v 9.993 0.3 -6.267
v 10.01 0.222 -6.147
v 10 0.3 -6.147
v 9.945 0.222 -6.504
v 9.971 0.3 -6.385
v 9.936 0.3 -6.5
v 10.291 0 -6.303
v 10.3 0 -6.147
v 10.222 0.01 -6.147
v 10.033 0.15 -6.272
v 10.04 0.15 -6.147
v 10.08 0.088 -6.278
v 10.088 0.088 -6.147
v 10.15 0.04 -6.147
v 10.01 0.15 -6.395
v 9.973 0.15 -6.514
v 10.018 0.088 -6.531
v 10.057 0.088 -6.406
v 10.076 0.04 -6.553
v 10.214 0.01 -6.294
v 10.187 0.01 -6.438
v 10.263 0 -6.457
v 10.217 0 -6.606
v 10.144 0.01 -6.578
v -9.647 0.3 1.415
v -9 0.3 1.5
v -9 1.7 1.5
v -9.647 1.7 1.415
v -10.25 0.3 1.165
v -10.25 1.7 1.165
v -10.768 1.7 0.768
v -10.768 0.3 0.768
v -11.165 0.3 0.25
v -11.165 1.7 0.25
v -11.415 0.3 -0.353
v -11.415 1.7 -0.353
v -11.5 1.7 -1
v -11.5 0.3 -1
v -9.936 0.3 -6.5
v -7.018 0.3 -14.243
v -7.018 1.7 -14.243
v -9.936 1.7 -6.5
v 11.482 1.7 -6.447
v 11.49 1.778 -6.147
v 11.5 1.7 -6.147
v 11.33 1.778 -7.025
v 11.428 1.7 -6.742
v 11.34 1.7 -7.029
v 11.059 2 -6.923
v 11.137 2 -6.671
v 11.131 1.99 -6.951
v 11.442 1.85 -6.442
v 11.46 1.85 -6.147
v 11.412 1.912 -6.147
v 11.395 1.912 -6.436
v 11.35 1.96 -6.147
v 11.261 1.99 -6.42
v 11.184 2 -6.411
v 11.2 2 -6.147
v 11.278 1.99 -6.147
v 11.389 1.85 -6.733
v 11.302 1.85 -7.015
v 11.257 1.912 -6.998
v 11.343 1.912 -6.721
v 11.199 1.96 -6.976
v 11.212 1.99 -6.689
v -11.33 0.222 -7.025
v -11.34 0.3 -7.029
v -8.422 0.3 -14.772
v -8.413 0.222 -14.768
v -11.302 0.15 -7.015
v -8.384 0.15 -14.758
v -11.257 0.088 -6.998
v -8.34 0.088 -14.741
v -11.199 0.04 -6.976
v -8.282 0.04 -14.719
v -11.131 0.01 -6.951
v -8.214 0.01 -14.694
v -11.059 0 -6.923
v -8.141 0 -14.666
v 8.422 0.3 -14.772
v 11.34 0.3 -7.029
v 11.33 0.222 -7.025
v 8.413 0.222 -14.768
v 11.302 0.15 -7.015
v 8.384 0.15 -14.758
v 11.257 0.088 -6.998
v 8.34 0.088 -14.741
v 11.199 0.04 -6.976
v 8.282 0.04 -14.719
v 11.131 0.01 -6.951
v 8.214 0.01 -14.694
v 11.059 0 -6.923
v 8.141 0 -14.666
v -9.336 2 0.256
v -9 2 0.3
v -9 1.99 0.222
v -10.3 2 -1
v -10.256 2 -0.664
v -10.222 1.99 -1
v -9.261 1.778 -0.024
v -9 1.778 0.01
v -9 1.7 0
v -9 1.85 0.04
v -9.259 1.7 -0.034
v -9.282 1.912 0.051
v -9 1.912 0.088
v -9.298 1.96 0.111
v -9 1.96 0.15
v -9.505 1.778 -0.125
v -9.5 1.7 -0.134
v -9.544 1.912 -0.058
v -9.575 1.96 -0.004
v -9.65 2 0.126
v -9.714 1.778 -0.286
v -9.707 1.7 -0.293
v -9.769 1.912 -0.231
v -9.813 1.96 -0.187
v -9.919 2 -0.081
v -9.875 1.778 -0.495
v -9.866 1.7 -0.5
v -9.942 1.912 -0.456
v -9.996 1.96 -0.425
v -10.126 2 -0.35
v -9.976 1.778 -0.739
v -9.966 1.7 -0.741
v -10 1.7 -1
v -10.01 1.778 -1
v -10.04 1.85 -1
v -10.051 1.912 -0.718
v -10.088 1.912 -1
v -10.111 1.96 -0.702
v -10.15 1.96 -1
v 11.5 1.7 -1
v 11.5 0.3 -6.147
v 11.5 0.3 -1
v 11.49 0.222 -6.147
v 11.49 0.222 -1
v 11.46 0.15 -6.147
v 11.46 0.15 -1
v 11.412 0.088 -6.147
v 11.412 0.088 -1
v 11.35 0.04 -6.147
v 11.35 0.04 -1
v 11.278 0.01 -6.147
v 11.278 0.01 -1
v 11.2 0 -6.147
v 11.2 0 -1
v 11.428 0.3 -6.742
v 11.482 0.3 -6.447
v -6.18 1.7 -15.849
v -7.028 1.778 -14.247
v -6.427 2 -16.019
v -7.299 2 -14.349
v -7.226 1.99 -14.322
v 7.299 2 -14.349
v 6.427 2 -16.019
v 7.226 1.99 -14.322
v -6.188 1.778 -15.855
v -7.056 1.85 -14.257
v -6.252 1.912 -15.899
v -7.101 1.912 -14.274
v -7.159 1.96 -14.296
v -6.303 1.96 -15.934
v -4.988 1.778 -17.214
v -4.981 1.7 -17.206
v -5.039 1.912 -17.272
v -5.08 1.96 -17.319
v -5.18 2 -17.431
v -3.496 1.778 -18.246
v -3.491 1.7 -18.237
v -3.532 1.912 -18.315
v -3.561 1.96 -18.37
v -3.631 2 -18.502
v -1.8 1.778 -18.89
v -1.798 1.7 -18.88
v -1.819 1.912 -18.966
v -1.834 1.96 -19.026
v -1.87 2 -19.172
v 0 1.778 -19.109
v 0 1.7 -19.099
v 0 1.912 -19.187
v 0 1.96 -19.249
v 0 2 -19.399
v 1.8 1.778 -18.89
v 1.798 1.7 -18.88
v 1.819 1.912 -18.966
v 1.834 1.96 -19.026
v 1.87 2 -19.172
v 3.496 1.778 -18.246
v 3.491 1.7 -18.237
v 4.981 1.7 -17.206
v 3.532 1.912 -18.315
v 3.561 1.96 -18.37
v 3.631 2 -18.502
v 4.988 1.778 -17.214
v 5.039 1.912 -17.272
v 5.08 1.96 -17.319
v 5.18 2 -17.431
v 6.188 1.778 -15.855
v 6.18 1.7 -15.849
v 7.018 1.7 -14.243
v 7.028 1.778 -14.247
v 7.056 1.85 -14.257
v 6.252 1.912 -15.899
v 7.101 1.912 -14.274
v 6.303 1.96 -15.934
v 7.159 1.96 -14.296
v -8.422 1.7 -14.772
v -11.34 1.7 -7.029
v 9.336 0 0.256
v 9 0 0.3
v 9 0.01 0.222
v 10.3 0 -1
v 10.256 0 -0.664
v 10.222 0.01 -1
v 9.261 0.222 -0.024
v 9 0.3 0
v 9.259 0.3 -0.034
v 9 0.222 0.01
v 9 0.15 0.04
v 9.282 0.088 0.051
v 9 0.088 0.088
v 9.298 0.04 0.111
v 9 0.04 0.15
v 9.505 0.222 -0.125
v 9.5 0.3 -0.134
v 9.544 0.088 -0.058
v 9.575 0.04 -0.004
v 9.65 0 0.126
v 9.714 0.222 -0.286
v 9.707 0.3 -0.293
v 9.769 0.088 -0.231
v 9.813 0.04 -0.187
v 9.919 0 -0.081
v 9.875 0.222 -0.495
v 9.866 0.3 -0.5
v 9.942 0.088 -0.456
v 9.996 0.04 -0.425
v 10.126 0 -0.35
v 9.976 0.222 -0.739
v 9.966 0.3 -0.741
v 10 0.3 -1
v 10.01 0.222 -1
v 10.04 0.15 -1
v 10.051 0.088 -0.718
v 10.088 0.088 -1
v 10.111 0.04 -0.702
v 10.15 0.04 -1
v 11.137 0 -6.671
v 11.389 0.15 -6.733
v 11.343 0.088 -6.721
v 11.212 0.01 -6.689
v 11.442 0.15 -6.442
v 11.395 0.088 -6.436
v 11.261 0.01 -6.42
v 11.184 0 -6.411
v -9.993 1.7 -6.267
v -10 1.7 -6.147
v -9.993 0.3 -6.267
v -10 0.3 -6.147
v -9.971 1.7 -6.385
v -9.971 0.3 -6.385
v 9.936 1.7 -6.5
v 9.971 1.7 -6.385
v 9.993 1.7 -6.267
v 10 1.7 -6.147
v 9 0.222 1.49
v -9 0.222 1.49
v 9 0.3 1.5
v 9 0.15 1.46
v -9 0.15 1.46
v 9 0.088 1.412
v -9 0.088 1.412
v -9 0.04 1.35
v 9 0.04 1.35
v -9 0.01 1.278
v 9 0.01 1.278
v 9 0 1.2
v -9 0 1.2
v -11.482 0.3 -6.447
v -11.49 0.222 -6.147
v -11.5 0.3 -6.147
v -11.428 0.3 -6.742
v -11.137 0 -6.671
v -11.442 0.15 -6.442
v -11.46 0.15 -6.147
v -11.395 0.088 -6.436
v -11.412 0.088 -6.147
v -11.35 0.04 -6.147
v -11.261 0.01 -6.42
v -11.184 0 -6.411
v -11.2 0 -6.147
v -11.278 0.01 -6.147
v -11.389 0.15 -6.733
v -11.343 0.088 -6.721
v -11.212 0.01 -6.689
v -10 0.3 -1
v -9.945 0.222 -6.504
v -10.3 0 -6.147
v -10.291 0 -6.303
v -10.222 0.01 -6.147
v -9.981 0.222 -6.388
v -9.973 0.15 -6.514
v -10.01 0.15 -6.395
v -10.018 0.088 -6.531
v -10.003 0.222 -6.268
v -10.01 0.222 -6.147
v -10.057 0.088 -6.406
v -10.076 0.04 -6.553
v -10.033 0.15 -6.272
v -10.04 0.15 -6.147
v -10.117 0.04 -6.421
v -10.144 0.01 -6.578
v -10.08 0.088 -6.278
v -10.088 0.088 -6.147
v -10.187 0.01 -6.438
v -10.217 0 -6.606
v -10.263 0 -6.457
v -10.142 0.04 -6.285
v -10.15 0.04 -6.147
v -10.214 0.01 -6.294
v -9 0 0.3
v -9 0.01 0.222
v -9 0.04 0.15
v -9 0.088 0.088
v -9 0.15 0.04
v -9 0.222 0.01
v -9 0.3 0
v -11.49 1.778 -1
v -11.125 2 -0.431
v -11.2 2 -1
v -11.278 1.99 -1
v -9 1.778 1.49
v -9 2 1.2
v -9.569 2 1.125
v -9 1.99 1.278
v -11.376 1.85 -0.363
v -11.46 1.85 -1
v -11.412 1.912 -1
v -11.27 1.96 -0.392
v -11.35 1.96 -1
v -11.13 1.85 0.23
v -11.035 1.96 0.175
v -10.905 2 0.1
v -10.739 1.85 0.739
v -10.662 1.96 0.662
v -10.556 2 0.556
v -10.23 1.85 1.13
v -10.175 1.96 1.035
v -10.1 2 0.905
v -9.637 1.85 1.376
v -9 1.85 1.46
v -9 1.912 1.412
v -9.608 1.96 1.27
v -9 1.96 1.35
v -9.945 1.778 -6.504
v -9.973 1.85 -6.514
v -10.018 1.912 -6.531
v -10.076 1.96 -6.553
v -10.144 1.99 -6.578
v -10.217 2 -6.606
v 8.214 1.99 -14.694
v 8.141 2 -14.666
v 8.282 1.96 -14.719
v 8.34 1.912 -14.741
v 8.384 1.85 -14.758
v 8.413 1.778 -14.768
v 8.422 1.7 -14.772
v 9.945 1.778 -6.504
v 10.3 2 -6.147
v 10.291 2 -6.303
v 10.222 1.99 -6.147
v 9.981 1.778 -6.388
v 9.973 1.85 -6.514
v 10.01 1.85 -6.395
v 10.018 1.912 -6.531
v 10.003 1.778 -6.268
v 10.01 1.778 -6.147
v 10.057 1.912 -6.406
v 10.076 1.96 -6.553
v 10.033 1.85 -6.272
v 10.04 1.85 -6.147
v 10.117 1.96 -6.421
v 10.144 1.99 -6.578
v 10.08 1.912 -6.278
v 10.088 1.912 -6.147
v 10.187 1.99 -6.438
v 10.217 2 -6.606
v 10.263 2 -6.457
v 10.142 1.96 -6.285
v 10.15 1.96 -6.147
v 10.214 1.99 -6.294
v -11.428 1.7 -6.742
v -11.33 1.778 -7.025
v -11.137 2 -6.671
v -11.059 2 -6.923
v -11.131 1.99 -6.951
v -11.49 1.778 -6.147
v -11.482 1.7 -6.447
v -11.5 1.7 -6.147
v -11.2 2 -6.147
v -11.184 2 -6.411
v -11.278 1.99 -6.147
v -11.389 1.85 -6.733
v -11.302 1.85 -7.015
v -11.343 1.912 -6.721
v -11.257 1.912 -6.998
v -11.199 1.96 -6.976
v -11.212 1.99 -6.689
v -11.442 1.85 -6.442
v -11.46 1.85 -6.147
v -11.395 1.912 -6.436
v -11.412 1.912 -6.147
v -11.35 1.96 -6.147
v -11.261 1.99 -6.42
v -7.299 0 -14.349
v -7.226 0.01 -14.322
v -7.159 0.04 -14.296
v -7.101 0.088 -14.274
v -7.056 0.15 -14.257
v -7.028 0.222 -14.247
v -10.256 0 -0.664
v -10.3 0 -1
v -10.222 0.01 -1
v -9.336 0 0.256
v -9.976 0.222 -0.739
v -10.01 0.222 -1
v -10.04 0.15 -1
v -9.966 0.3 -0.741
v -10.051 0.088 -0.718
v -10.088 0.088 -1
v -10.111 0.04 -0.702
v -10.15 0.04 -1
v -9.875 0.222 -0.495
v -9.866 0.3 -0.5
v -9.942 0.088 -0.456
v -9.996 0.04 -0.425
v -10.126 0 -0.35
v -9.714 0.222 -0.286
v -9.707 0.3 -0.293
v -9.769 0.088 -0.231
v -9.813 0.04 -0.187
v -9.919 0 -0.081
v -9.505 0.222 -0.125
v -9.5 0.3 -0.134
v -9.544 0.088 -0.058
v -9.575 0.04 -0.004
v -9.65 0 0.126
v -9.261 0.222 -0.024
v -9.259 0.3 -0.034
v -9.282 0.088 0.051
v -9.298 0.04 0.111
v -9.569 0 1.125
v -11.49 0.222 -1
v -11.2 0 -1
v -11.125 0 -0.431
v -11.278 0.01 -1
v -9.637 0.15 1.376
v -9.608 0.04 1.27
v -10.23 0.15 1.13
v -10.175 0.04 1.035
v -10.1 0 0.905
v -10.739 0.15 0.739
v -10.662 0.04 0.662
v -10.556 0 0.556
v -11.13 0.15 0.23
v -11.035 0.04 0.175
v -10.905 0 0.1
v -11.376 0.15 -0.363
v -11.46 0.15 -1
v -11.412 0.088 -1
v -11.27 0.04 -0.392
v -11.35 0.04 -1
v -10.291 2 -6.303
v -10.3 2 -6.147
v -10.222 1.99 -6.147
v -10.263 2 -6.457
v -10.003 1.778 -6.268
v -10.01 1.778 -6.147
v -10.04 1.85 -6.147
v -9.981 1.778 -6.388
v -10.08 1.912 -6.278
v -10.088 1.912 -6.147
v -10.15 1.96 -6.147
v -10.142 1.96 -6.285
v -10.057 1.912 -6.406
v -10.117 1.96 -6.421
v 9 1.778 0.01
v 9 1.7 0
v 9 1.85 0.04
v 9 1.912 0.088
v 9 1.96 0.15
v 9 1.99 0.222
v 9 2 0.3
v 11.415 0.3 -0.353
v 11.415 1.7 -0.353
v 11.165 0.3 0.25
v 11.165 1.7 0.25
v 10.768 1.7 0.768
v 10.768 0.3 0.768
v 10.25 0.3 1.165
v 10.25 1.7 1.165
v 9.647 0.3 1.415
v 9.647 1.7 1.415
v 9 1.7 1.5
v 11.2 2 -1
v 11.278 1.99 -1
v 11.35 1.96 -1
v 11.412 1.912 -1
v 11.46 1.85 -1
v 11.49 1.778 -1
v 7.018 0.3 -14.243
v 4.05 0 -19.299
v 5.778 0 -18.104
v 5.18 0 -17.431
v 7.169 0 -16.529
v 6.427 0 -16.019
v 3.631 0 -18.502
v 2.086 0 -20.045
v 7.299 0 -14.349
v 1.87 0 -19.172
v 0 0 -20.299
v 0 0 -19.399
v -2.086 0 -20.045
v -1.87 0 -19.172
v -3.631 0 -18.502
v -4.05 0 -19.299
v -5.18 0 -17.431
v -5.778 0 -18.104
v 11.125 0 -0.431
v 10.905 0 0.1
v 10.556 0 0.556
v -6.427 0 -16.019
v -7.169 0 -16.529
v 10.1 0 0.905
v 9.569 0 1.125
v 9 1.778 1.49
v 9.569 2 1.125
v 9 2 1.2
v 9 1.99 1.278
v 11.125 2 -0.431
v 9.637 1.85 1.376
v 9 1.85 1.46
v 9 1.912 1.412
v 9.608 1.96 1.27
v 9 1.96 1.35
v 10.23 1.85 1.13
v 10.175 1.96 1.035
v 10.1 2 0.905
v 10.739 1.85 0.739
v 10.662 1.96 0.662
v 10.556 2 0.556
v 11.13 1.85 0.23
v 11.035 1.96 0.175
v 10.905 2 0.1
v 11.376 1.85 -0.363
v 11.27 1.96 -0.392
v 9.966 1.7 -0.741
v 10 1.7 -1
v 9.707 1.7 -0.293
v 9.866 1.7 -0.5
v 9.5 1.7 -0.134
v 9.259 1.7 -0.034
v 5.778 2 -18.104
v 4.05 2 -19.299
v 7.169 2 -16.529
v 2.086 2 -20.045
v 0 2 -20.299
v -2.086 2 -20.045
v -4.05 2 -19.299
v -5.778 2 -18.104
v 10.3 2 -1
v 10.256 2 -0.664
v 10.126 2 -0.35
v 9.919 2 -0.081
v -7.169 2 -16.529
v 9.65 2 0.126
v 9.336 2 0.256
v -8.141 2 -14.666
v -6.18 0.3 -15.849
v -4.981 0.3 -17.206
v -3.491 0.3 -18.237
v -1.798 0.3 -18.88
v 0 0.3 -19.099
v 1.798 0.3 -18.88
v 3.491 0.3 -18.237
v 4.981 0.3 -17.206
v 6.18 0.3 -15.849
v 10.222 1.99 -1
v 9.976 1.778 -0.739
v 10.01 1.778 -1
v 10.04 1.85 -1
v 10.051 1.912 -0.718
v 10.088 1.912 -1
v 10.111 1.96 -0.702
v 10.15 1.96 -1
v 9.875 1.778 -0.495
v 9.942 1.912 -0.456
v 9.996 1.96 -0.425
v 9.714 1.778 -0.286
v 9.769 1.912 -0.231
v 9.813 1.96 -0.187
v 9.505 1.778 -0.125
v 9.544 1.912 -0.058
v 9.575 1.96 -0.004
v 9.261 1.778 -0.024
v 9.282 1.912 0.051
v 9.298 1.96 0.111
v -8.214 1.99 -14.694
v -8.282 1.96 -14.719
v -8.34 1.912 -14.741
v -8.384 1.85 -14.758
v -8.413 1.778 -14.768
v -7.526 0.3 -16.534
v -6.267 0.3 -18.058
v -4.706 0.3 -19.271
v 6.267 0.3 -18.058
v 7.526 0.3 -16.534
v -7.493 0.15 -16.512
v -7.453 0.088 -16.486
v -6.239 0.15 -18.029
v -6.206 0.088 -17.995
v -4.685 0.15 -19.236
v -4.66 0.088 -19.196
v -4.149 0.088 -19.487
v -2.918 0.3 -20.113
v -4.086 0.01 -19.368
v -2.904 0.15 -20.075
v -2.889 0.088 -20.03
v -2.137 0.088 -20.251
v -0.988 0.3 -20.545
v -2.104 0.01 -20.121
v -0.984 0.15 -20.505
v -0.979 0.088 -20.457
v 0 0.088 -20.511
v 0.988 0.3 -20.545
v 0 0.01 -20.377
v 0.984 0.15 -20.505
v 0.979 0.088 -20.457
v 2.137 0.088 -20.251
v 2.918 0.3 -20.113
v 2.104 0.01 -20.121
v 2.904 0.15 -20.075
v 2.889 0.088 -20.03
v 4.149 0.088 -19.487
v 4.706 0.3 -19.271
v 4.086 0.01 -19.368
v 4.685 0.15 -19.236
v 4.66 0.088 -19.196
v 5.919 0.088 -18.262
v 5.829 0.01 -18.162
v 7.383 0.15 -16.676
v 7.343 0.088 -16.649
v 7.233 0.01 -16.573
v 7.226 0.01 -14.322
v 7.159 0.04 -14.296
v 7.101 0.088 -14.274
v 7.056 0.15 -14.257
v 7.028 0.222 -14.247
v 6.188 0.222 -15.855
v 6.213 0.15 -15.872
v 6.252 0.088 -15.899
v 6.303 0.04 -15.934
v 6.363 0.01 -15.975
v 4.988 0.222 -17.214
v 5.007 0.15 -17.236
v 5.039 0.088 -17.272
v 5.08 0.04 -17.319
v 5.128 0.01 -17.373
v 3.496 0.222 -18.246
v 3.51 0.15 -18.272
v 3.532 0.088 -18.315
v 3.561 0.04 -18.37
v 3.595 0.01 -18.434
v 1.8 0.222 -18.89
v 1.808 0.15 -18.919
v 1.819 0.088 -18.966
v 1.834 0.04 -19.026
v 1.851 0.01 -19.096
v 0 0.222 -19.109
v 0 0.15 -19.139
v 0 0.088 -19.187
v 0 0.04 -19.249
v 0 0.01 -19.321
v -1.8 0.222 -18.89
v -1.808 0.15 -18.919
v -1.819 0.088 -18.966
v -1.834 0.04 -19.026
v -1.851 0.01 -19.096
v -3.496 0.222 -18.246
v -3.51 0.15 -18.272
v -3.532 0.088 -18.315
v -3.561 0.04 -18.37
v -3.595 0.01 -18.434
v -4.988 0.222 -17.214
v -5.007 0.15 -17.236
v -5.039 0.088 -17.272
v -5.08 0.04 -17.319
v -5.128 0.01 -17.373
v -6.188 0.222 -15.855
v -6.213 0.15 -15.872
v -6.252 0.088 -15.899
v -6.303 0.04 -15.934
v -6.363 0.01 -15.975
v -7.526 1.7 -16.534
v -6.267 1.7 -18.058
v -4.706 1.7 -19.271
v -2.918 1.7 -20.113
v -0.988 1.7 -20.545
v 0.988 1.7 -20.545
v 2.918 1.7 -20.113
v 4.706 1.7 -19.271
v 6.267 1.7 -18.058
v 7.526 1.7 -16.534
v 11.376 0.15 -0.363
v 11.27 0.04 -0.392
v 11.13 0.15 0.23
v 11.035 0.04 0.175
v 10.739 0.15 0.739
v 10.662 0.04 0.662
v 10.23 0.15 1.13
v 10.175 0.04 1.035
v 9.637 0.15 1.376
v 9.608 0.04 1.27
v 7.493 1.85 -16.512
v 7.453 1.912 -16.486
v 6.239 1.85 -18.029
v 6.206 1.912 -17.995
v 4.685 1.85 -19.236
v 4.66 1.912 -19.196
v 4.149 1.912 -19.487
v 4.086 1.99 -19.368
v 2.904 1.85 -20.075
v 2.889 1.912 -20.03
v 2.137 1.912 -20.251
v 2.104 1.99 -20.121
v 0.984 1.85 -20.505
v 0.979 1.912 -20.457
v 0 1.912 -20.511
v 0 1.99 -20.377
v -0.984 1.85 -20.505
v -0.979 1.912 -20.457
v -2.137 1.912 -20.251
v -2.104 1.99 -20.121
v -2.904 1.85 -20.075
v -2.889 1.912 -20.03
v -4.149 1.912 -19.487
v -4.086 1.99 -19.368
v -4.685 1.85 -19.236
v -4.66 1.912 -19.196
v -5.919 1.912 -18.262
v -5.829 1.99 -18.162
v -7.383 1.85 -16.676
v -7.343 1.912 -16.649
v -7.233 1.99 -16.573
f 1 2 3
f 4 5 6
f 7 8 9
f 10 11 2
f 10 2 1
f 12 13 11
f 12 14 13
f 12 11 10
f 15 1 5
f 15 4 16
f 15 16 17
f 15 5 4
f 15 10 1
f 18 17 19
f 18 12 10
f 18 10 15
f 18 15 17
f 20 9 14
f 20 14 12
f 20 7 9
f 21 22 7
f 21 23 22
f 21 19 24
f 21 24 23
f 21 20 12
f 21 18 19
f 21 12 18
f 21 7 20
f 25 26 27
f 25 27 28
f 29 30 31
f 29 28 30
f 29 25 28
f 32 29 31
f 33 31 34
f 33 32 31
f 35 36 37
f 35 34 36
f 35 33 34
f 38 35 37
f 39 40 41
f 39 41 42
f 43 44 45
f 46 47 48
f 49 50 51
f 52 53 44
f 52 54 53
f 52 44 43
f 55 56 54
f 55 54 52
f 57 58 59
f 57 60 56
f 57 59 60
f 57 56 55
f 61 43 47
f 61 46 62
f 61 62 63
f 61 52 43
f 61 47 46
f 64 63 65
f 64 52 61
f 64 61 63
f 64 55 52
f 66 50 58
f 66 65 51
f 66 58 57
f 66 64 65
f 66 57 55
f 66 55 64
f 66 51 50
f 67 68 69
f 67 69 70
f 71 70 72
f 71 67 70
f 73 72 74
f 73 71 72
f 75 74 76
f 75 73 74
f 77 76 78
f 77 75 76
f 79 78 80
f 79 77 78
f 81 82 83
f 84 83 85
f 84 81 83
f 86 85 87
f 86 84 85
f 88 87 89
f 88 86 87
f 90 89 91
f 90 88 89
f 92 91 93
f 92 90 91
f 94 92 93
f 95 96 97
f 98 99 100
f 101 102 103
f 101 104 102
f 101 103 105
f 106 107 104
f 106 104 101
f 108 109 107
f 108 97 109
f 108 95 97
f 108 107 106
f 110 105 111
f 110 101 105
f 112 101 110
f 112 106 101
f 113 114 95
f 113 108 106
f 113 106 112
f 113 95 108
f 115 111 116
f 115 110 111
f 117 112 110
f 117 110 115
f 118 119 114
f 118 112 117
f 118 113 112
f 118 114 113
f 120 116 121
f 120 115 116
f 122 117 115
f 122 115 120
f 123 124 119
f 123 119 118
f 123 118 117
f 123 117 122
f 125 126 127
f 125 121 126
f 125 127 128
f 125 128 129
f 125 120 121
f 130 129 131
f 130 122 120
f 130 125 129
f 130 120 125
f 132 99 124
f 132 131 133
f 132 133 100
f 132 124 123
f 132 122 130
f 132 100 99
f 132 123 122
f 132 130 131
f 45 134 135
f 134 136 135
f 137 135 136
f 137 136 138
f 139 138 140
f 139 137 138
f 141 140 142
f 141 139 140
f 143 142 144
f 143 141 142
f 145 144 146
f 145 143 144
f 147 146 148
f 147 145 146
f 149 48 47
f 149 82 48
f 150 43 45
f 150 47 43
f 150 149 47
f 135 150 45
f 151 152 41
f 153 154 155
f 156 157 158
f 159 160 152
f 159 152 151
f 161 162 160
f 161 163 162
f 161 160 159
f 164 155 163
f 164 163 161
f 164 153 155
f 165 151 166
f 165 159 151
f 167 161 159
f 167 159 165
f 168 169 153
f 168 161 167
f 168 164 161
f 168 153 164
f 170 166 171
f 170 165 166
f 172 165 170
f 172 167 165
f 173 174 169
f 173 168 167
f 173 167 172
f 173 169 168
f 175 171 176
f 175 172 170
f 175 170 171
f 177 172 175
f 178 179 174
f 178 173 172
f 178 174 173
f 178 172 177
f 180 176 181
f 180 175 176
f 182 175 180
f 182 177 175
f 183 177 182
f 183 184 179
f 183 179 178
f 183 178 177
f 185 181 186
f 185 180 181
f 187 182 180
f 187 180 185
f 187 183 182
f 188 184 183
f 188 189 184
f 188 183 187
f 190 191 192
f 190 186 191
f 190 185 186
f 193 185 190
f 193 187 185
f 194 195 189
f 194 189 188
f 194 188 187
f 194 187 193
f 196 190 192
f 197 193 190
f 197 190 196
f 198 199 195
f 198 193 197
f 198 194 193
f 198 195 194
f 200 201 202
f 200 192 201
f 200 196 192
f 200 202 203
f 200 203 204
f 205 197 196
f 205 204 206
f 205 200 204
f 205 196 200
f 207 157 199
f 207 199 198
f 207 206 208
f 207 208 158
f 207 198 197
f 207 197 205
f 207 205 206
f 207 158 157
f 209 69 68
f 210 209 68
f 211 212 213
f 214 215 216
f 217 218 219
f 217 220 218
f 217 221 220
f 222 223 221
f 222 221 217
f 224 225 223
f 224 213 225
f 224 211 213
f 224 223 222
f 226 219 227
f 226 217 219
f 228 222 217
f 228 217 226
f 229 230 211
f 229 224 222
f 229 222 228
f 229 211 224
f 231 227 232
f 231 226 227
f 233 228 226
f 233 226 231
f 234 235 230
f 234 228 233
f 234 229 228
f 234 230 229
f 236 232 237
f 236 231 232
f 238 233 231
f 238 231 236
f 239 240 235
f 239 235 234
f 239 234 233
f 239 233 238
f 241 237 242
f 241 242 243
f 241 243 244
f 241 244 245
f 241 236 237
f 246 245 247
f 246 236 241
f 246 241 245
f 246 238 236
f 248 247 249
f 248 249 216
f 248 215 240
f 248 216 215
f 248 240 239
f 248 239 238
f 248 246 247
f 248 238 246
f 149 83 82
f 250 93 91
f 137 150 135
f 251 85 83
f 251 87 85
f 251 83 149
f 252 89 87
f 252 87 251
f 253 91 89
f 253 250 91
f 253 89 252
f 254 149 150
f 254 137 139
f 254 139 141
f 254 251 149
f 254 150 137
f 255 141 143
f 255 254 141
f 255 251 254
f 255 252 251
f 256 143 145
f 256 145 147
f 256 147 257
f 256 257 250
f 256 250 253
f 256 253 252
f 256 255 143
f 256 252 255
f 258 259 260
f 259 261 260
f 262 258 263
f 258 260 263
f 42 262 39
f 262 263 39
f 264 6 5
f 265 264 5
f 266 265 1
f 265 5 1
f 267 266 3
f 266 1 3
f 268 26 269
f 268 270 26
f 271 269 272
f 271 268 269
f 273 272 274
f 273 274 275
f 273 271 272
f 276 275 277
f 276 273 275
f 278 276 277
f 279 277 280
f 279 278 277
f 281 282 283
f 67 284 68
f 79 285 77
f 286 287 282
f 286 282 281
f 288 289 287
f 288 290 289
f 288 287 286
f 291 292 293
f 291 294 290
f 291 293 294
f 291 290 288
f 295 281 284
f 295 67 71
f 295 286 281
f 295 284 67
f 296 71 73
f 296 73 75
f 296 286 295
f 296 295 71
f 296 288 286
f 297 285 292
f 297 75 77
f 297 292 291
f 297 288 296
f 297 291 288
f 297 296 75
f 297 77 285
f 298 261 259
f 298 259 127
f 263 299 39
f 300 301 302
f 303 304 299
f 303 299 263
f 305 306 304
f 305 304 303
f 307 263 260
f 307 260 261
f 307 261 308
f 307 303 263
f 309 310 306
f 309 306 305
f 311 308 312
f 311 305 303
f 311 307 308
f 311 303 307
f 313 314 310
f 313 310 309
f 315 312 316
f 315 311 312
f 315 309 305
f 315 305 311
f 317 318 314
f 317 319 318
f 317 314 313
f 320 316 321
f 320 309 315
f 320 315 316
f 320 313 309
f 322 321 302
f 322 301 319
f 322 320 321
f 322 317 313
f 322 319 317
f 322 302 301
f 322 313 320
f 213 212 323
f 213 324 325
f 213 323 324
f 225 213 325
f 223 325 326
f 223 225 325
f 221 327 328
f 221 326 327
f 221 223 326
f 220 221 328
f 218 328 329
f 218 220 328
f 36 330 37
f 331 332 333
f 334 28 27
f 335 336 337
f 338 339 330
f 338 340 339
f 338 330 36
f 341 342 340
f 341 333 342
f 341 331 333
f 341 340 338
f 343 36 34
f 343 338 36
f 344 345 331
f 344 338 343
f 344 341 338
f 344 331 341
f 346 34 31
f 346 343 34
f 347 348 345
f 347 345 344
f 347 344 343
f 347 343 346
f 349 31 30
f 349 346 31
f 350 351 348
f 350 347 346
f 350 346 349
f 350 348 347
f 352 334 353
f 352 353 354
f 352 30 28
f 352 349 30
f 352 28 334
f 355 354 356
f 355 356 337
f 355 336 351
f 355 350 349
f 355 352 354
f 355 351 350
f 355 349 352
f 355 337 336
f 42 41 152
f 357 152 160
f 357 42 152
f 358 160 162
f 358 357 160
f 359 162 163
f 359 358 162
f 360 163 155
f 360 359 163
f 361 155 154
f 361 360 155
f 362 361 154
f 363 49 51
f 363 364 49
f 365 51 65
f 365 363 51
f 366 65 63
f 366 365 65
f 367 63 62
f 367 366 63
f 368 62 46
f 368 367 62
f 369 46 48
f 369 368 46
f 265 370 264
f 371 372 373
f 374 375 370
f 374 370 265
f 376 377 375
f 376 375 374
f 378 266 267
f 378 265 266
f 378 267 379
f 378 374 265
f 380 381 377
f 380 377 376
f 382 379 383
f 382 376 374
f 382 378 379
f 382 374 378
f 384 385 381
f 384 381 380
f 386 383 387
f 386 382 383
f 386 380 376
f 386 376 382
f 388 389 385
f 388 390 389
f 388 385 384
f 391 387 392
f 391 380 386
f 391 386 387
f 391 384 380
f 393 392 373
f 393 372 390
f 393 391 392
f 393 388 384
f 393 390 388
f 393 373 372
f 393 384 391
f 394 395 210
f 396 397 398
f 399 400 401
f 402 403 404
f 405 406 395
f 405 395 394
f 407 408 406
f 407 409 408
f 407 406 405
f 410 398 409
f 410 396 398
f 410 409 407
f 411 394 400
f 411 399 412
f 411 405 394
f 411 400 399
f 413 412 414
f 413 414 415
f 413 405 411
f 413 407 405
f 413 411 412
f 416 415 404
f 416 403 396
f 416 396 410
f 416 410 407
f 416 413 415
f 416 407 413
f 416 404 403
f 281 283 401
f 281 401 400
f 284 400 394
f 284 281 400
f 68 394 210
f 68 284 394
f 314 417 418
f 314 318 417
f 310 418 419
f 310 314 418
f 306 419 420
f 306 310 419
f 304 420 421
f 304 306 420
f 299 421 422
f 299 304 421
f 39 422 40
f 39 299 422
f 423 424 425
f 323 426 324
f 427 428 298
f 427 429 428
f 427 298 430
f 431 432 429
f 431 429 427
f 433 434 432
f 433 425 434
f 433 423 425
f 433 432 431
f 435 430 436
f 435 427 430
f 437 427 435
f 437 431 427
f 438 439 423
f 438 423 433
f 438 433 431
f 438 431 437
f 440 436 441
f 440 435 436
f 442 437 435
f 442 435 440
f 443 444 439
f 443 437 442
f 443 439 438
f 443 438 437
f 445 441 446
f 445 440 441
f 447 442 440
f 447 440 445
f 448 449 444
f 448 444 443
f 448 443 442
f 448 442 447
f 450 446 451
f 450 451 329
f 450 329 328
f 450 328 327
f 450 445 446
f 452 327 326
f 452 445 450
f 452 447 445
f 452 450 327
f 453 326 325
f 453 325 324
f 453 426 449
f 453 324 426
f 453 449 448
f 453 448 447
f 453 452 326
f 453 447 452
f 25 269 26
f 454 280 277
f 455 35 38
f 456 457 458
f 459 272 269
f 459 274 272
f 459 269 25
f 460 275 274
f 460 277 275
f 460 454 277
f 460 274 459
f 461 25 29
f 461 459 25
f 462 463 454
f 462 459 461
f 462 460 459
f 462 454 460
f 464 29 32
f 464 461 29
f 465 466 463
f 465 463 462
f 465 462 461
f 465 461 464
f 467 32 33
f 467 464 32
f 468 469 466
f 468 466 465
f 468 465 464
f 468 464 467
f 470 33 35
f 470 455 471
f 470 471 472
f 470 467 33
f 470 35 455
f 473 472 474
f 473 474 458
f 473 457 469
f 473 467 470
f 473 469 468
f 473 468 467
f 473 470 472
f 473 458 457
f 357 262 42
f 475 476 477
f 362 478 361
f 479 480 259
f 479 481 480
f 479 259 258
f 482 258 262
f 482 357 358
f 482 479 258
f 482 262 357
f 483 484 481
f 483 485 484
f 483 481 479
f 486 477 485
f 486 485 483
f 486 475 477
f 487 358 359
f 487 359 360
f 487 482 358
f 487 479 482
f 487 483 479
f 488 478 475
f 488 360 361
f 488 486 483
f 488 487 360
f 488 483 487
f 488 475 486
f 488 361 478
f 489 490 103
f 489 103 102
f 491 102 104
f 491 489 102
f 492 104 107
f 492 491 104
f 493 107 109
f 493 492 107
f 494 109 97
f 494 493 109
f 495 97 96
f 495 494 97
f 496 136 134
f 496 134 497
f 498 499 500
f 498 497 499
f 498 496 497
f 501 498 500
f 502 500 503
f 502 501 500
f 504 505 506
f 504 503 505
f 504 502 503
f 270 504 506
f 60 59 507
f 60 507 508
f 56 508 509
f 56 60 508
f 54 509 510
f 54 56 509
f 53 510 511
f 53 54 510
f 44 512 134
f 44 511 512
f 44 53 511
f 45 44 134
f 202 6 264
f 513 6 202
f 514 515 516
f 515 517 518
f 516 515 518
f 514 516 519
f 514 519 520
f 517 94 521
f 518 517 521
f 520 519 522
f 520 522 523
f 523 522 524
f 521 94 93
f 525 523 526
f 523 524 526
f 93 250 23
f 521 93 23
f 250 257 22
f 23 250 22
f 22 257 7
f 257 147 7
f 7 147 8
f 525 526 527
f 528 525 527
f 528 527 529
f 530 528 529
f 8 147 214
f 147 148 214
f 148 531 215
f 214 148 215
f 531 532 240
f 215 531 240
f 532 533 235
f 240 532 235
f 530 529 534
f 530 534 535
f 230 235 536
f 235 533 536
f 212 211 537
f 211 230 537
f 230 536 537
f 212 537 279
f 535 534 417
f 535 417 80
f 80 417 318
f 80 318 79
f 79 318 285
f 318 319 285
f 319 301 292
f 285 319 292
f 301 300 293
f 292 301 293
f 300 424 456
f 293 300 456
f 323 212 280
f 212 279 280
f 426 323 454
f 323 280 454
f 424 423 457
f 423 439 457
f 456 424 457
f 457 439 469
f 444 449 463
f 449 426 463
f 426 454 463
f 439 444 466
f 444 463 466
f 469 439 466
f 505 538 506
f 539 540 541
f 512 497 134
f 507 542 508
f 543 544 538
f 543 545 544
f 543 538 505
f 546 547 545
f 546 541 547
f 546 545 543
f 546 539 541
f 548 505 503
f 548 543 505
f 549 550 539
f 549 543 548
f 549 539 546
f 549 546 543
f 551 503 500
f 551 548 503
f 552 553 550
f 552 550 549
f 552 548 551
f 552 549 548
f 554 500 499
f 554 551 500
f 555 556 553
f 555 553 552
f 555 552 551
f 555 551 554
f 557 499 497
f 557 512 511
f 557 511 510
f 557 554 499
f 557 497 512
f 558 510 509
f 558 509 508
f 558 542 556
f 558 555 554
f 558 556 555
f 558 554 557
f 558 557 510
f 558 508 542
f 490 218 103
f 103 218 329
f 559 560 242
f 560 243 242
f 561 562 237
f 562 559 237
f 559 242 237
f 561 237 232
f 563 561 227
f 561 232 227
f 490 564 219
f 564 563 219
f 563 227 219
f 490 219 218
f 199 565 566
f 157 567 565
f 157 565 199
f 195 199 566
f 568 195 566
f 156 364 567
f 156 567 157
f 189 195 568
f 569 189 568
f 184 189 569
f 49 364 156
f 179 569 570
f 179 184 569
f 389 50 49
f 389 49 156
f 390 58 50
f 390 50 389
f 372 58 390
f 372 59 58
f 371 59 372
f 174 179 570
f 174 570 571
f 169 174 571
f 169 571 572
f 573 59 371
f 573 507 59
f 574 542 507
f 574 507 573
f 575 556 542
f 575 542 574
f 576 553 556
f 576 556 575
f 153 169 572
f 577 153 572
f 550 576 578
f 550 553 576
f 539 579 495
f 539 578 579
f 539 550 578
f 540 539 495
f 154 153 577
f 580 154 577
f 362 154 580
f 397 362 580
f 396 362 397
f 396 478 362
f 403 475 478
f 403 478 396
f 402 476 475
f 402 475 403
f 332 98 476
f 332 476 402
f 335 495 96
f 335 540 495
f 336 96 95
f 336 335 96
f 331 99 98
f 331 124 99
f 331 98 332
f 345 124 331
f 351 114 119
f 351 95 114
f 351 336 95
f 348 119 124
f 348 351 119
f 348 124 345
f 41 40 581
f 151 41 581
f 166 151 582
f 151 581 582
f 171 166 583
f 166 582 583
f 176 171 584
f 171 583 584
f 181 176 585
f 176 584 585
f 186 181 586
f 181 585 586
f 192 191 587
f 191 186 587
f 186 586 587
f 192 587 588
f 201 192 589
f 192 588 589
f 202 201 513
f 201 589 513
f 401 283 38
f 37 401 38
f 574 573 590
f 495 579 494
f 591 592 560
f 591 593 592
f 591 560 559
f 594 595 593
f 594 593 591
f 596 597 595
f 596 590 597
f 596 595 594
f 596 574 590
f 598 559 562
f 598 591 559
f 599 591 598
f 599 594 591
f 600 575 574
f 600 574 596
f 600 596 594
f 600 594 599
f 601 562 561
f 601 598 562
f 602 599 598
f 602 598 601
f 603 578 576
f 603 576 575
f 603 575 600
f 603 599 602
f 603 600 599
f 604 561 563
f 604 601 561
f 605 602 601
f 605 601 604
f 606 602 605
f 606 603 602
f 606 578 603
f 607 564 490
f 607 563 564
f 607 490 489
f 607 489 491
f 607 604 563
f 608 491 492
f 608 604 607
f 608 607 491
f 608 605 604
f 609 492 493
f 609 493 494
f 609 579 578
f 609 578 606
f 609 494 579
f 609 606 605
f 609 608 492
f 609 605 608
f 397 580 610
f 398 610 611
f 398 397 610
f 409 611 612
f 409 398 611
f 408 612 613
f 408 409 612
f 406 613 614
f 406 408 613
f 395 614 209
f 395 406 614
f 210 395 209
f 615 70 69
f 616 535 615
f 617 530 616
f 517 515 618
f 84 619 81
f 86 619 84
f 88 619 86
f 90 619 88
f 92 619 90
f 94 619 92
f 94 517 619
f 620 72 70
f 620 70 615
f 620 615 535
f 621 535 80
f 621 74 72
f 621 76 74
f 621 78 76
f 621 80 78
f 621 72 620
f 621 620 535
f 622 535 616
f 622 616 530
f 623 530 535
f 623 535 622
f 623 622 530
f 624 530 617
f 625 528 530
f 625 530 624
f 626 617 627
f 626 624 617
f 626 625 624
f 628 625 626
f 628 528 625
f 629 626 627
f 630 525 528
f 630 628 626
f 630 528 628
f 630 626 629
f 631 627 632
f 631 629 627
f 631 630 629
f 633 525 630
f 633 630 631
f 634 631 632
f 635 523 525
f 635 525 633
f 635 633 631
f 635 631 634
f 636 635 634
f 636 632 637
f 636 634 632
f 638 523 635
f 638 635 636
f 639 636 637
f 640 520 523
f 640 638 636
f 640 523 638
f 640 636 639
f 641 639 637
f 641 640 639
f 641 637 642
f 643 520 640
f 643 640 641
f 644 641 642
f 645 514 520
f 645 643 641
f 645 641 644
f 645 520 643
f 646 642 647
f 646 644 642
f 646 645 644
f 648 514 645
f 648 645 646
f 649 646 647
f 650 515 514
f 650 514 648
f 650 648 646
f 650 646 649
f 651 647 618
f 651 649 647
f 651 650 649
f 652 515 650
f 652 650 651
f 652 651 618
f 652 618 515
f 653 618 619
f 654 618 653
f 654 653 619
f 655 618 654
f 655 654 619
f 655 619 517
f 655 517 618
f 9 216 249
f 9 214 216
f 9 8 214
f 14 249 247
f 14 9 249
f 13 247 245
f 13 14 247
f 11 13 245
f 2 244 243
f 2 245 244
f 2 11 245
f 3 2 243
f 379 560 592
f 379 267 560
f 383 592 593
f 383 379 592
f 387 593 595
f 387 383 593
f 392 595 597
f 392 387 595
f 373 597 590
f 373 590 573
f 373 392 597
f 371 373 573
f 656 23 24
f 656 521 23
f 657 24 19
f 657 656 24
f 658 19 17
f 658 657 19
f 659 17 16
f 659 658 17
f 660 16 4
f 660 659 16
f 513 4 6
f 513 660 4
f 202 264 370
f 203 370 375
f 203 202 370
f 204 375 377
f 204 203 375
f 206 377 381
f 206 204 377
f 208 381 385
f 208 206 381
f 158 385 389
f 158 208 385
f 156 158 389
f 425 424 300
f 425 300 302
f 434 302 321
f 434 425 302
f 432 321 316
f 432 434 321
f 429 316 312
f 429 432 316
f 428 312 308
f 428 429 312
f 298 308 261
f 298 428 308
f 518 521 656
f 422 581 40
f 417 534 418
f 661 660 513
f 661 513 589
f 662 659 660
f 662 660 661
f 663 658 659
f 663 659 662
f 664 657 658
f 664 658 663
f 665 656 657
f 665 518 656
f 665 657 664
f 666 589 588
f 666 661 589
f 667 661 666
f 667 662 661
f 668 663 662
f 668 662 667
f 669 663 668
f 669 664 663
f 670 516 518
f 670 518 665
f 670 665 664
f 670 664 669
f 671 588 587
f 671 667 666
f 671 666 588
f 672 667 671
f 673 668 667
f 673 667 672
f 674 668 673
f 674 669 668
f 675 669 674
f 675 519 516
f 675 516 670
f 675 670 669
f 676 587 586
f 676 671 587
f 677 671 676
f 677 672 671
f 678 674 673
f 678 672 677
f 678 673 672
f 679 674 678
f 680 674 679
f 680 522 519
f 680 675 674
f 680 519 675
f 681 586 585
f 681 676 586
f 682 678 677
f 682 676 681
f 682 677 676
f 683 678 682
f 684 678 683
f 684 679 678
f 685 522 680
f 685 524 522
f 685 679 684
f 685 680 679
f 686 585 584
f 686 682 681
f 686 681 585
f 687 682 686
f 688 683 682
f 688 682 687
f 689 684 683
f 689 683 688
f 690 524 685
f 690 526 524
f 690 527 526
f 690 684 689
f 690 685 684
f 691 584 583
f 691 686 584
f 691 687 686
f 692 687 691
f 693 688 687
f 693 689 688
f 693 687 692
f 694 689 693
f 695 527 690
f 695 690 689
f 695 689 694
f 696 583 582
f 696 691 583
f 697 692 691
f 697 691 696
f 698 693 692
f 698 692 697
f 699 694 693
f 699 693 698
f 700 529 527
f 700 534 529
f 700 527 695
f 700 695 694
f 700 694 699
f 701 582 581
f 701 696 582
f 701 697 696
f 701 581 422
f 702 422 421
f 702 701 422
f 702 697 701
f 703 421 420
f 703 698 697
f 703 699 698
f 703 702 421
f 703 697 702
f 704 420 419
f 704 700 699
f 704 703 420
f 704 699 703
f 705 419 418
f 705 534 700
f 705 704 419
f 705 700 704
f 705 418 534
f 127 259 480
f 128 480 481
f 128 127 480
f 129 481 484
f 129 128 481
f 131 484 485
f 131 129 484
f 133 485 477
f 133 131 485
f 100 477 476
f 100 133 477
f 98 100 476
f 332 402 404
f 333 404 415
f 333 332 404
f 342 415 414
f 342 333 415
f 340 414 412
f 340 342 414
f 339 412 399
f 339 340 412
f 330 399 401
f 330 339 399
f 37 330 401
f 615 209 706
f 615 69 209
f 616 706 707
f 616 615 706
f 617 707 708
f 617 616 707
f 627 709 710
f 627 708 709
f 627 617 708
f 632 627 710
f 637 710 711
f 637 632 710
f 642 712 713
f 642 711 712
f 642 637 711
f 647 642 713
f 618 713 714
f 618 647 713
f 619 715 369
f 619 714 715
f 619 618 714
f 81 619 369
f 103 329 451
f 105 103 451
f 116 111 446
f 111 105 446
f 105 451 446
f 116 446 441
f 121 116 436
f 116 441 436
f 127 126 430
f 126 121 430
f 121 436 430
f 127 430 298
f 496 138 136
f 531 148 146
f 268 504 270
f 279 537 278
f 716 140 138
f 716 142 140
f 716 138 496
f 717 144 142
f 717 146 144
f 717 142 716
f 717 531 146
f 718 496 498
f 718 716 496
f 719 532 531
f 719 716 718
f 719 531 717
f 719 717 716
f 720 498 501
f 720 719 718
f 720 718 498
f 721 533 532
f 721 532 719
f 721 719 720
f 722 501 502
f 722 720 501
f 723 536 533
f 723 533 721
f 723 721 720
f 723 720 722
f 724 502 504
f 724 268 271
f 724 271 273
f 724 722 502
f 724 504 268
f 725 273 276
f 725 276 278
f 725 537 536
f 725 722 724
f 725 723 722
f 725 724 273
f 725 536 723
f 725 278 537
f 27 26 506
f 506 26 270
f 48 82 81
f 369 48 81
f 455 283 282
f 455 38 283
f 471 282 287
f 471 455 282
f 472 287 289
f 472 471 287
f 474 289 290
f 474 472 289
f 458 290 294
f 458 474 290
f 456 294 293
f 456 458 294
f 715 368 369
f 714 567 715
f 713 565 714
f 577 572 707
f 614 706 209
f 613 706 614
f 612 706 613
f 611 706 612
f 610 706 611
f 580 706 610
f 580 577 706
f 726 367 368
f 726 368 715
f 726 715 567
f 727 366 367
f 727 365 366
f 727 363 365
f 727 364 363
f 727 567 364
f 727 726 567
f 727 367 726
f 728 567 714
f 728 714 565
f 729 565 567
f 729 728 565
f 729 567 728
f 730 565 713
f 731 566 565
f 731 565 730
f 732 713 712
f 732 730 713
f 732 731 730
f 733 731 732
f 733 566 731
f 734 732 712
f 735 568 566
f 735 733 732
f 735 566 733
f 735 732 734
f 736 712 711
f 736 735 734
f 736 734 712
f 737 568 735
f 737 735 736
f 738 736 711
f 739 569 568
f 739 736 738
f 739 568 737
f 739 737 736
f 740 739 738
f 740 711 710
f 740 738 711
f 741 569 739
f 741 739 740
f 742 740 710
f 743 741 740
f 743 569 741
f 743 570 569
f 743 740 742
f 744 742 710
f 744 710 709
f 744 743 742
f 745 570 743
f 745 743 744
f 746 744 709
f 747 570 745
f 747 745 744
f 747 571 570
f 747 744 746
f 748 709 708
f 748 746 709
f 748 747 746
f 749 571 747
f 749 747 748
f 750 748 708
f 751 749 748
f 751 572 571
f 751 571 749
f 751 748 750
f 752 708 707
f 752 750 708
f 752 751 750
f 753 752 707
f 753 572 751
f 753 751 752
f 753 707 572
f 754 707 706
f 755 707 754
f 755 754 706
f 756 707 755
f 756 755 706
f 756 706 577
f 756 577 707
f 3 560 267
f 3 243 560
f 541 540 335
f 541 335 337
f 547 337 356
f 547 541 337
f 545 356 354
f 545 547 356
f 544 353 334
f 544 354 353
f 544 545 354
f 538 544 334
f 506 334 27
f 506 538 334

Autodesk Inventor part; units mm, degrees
ref_plane "YZ Plane" through (0, 0, 0) normal (1, 0, 0) x (0, 1, 0)
ref_plane "XZ Plane" through (0, 0, 0) normal (0, 1, 0) x (-1, 0, 0)
ref_plane "XY Plane" through (0, 0, 0) normal (0, 0, 1) x (1, 0, 0)
sketch "Sketch1" plane through (0, 0, 0) normal (0, 1, 0) x (-1, 0, 0)
  line L0 (-9, 0) -> (9, 0)
  arc A0 (-9, 0) -> (-10, -1) centre (-9, -1) ccw
  line L1 (-10, -1) -> (-10, -6.1474)
  arc A1 (-10, -6.1474) -> (-9.9358, -6.5) centre (-9, -6.1474) ccw
  line L2 (-9.9358, -6.5) -> (-7.0184, -14.2433)
  arc A2 (-7.0184, -14.2433) -> (7.0184, -14.2433) centre (0, -11.599) ccw
  line L3 (7.0184, -14.2433) -> (9.9358, -6.5)
  arc A3 (9.9358, -6.5) -> (10, -6.1474) centre (9, -6.1474) ccw
  line L4 (10, -6.1474) -> (10, -1)
  arc A4 (10, -1) -> (9, 0) centre (9, -1) ccw
  line L5 (9, 1.5) -> (-9, 1.5)
  arc A5 (-9, 1.5) -> (-11.5, -1) centre (-9, -1) ccw
  line L6 (-11.5, -1) -> (-11.5, -6.1474)
  arc A6 (-11.5, -6.1474) -> (-11.3395, -7.0289) centre (-9, -6.1474) ccw
  line L7 (-11.3395, -7.0289) -> (-8.4221, -14.7721)
  arc A7 (-8.4221, -14.7721) -> (8.4221, -14.7721) centre (0, -11.599) ccw
  line L8 (8.4221, -14.7721) -> (11.3395, -7.0289)
  arc A8 (11.3395, -7.0289) -> (11.5, -6.1474) centre (9, -6.1474) ccw
  line L9 (11.5, -6.1474) -> (11.5, -1)
  arc A9 (11.5, -1) -> (9, 1.5) centre (9, -1) ccw
  point P0 (0, 0)
  point P1 (0, 0)
  dimension "d0" = 18
  dimension "d1" = 6.5
  dimension "d2" = 1
  dimension "d3" = 1
  dimension "d4" = 9
  dimension "d5" = 7.5
  dimension "d6" = 1
  dimension "d7" = 1
  dimension "d8" = 11.599
  dimension "d9" = 1.5
extrude "Extrusion1" add sketch "Sketch1" along normal blind 2
fillet "Fillet1" radius 0.3 40 edges at (10.7678, 2, 0.7678) (11.5, 2, -3.5737) (11.4595, 2, -6.5954) (9.8808, 2, -10.9005) (0, 2, -20.599) (-9.8808, 2, -10.9005) (-11.4595, 2, -6.5954) (-11.5, 2, -3.5737) (-10.7678, 2, 0.7678) (0, 2, 1.5) (10.7678, 0, 0.7678) (11.5, 0, -3.5737) (11.4595, 0, -6.5954) (9.8808, 0, -10.9005) (0, 0, -20.599) (-9.8808, 0, -10.9005) (-11.4595, 0, -6.5954) (-11.5, 0, -3.5737) (-10.7678, 0, 0.7678) (0, 0, 1.5) (-9.7071, 2, -0.2929) (-10, 2, -3.5737) (-9.9838, 2, -6.3266) (-8.4771, 2, -10.3716) (0, 2, -19.099) (8.4771, 2, -10.3716) (9.9838, 2, -6.3266) (10, 2, -3.5737) (9.7071, 2, -0.2929) (0, 2, 0) (9.7071, 0, -0.2929) (10, 0, -3.5737) (9.9838, 0, -6.3266) (8.4771, 0, -10.3716) (0, 0, -19.099) (-8.4771, 0, -10.3716) (-9.9838, 0, -6.3266) (-10, 0, -3.5737) (-9.7071, 0, -0.2929) (0, 0, 0)
equation "\"d3\" = d2"
equation "\"d4\" = 0.5 * d0"
equation "\"d6\" = d3"
equation "\"d7\" = d6"
properties part number "y_carryage_bearing_zip_tie" material "ABS Plastic"
